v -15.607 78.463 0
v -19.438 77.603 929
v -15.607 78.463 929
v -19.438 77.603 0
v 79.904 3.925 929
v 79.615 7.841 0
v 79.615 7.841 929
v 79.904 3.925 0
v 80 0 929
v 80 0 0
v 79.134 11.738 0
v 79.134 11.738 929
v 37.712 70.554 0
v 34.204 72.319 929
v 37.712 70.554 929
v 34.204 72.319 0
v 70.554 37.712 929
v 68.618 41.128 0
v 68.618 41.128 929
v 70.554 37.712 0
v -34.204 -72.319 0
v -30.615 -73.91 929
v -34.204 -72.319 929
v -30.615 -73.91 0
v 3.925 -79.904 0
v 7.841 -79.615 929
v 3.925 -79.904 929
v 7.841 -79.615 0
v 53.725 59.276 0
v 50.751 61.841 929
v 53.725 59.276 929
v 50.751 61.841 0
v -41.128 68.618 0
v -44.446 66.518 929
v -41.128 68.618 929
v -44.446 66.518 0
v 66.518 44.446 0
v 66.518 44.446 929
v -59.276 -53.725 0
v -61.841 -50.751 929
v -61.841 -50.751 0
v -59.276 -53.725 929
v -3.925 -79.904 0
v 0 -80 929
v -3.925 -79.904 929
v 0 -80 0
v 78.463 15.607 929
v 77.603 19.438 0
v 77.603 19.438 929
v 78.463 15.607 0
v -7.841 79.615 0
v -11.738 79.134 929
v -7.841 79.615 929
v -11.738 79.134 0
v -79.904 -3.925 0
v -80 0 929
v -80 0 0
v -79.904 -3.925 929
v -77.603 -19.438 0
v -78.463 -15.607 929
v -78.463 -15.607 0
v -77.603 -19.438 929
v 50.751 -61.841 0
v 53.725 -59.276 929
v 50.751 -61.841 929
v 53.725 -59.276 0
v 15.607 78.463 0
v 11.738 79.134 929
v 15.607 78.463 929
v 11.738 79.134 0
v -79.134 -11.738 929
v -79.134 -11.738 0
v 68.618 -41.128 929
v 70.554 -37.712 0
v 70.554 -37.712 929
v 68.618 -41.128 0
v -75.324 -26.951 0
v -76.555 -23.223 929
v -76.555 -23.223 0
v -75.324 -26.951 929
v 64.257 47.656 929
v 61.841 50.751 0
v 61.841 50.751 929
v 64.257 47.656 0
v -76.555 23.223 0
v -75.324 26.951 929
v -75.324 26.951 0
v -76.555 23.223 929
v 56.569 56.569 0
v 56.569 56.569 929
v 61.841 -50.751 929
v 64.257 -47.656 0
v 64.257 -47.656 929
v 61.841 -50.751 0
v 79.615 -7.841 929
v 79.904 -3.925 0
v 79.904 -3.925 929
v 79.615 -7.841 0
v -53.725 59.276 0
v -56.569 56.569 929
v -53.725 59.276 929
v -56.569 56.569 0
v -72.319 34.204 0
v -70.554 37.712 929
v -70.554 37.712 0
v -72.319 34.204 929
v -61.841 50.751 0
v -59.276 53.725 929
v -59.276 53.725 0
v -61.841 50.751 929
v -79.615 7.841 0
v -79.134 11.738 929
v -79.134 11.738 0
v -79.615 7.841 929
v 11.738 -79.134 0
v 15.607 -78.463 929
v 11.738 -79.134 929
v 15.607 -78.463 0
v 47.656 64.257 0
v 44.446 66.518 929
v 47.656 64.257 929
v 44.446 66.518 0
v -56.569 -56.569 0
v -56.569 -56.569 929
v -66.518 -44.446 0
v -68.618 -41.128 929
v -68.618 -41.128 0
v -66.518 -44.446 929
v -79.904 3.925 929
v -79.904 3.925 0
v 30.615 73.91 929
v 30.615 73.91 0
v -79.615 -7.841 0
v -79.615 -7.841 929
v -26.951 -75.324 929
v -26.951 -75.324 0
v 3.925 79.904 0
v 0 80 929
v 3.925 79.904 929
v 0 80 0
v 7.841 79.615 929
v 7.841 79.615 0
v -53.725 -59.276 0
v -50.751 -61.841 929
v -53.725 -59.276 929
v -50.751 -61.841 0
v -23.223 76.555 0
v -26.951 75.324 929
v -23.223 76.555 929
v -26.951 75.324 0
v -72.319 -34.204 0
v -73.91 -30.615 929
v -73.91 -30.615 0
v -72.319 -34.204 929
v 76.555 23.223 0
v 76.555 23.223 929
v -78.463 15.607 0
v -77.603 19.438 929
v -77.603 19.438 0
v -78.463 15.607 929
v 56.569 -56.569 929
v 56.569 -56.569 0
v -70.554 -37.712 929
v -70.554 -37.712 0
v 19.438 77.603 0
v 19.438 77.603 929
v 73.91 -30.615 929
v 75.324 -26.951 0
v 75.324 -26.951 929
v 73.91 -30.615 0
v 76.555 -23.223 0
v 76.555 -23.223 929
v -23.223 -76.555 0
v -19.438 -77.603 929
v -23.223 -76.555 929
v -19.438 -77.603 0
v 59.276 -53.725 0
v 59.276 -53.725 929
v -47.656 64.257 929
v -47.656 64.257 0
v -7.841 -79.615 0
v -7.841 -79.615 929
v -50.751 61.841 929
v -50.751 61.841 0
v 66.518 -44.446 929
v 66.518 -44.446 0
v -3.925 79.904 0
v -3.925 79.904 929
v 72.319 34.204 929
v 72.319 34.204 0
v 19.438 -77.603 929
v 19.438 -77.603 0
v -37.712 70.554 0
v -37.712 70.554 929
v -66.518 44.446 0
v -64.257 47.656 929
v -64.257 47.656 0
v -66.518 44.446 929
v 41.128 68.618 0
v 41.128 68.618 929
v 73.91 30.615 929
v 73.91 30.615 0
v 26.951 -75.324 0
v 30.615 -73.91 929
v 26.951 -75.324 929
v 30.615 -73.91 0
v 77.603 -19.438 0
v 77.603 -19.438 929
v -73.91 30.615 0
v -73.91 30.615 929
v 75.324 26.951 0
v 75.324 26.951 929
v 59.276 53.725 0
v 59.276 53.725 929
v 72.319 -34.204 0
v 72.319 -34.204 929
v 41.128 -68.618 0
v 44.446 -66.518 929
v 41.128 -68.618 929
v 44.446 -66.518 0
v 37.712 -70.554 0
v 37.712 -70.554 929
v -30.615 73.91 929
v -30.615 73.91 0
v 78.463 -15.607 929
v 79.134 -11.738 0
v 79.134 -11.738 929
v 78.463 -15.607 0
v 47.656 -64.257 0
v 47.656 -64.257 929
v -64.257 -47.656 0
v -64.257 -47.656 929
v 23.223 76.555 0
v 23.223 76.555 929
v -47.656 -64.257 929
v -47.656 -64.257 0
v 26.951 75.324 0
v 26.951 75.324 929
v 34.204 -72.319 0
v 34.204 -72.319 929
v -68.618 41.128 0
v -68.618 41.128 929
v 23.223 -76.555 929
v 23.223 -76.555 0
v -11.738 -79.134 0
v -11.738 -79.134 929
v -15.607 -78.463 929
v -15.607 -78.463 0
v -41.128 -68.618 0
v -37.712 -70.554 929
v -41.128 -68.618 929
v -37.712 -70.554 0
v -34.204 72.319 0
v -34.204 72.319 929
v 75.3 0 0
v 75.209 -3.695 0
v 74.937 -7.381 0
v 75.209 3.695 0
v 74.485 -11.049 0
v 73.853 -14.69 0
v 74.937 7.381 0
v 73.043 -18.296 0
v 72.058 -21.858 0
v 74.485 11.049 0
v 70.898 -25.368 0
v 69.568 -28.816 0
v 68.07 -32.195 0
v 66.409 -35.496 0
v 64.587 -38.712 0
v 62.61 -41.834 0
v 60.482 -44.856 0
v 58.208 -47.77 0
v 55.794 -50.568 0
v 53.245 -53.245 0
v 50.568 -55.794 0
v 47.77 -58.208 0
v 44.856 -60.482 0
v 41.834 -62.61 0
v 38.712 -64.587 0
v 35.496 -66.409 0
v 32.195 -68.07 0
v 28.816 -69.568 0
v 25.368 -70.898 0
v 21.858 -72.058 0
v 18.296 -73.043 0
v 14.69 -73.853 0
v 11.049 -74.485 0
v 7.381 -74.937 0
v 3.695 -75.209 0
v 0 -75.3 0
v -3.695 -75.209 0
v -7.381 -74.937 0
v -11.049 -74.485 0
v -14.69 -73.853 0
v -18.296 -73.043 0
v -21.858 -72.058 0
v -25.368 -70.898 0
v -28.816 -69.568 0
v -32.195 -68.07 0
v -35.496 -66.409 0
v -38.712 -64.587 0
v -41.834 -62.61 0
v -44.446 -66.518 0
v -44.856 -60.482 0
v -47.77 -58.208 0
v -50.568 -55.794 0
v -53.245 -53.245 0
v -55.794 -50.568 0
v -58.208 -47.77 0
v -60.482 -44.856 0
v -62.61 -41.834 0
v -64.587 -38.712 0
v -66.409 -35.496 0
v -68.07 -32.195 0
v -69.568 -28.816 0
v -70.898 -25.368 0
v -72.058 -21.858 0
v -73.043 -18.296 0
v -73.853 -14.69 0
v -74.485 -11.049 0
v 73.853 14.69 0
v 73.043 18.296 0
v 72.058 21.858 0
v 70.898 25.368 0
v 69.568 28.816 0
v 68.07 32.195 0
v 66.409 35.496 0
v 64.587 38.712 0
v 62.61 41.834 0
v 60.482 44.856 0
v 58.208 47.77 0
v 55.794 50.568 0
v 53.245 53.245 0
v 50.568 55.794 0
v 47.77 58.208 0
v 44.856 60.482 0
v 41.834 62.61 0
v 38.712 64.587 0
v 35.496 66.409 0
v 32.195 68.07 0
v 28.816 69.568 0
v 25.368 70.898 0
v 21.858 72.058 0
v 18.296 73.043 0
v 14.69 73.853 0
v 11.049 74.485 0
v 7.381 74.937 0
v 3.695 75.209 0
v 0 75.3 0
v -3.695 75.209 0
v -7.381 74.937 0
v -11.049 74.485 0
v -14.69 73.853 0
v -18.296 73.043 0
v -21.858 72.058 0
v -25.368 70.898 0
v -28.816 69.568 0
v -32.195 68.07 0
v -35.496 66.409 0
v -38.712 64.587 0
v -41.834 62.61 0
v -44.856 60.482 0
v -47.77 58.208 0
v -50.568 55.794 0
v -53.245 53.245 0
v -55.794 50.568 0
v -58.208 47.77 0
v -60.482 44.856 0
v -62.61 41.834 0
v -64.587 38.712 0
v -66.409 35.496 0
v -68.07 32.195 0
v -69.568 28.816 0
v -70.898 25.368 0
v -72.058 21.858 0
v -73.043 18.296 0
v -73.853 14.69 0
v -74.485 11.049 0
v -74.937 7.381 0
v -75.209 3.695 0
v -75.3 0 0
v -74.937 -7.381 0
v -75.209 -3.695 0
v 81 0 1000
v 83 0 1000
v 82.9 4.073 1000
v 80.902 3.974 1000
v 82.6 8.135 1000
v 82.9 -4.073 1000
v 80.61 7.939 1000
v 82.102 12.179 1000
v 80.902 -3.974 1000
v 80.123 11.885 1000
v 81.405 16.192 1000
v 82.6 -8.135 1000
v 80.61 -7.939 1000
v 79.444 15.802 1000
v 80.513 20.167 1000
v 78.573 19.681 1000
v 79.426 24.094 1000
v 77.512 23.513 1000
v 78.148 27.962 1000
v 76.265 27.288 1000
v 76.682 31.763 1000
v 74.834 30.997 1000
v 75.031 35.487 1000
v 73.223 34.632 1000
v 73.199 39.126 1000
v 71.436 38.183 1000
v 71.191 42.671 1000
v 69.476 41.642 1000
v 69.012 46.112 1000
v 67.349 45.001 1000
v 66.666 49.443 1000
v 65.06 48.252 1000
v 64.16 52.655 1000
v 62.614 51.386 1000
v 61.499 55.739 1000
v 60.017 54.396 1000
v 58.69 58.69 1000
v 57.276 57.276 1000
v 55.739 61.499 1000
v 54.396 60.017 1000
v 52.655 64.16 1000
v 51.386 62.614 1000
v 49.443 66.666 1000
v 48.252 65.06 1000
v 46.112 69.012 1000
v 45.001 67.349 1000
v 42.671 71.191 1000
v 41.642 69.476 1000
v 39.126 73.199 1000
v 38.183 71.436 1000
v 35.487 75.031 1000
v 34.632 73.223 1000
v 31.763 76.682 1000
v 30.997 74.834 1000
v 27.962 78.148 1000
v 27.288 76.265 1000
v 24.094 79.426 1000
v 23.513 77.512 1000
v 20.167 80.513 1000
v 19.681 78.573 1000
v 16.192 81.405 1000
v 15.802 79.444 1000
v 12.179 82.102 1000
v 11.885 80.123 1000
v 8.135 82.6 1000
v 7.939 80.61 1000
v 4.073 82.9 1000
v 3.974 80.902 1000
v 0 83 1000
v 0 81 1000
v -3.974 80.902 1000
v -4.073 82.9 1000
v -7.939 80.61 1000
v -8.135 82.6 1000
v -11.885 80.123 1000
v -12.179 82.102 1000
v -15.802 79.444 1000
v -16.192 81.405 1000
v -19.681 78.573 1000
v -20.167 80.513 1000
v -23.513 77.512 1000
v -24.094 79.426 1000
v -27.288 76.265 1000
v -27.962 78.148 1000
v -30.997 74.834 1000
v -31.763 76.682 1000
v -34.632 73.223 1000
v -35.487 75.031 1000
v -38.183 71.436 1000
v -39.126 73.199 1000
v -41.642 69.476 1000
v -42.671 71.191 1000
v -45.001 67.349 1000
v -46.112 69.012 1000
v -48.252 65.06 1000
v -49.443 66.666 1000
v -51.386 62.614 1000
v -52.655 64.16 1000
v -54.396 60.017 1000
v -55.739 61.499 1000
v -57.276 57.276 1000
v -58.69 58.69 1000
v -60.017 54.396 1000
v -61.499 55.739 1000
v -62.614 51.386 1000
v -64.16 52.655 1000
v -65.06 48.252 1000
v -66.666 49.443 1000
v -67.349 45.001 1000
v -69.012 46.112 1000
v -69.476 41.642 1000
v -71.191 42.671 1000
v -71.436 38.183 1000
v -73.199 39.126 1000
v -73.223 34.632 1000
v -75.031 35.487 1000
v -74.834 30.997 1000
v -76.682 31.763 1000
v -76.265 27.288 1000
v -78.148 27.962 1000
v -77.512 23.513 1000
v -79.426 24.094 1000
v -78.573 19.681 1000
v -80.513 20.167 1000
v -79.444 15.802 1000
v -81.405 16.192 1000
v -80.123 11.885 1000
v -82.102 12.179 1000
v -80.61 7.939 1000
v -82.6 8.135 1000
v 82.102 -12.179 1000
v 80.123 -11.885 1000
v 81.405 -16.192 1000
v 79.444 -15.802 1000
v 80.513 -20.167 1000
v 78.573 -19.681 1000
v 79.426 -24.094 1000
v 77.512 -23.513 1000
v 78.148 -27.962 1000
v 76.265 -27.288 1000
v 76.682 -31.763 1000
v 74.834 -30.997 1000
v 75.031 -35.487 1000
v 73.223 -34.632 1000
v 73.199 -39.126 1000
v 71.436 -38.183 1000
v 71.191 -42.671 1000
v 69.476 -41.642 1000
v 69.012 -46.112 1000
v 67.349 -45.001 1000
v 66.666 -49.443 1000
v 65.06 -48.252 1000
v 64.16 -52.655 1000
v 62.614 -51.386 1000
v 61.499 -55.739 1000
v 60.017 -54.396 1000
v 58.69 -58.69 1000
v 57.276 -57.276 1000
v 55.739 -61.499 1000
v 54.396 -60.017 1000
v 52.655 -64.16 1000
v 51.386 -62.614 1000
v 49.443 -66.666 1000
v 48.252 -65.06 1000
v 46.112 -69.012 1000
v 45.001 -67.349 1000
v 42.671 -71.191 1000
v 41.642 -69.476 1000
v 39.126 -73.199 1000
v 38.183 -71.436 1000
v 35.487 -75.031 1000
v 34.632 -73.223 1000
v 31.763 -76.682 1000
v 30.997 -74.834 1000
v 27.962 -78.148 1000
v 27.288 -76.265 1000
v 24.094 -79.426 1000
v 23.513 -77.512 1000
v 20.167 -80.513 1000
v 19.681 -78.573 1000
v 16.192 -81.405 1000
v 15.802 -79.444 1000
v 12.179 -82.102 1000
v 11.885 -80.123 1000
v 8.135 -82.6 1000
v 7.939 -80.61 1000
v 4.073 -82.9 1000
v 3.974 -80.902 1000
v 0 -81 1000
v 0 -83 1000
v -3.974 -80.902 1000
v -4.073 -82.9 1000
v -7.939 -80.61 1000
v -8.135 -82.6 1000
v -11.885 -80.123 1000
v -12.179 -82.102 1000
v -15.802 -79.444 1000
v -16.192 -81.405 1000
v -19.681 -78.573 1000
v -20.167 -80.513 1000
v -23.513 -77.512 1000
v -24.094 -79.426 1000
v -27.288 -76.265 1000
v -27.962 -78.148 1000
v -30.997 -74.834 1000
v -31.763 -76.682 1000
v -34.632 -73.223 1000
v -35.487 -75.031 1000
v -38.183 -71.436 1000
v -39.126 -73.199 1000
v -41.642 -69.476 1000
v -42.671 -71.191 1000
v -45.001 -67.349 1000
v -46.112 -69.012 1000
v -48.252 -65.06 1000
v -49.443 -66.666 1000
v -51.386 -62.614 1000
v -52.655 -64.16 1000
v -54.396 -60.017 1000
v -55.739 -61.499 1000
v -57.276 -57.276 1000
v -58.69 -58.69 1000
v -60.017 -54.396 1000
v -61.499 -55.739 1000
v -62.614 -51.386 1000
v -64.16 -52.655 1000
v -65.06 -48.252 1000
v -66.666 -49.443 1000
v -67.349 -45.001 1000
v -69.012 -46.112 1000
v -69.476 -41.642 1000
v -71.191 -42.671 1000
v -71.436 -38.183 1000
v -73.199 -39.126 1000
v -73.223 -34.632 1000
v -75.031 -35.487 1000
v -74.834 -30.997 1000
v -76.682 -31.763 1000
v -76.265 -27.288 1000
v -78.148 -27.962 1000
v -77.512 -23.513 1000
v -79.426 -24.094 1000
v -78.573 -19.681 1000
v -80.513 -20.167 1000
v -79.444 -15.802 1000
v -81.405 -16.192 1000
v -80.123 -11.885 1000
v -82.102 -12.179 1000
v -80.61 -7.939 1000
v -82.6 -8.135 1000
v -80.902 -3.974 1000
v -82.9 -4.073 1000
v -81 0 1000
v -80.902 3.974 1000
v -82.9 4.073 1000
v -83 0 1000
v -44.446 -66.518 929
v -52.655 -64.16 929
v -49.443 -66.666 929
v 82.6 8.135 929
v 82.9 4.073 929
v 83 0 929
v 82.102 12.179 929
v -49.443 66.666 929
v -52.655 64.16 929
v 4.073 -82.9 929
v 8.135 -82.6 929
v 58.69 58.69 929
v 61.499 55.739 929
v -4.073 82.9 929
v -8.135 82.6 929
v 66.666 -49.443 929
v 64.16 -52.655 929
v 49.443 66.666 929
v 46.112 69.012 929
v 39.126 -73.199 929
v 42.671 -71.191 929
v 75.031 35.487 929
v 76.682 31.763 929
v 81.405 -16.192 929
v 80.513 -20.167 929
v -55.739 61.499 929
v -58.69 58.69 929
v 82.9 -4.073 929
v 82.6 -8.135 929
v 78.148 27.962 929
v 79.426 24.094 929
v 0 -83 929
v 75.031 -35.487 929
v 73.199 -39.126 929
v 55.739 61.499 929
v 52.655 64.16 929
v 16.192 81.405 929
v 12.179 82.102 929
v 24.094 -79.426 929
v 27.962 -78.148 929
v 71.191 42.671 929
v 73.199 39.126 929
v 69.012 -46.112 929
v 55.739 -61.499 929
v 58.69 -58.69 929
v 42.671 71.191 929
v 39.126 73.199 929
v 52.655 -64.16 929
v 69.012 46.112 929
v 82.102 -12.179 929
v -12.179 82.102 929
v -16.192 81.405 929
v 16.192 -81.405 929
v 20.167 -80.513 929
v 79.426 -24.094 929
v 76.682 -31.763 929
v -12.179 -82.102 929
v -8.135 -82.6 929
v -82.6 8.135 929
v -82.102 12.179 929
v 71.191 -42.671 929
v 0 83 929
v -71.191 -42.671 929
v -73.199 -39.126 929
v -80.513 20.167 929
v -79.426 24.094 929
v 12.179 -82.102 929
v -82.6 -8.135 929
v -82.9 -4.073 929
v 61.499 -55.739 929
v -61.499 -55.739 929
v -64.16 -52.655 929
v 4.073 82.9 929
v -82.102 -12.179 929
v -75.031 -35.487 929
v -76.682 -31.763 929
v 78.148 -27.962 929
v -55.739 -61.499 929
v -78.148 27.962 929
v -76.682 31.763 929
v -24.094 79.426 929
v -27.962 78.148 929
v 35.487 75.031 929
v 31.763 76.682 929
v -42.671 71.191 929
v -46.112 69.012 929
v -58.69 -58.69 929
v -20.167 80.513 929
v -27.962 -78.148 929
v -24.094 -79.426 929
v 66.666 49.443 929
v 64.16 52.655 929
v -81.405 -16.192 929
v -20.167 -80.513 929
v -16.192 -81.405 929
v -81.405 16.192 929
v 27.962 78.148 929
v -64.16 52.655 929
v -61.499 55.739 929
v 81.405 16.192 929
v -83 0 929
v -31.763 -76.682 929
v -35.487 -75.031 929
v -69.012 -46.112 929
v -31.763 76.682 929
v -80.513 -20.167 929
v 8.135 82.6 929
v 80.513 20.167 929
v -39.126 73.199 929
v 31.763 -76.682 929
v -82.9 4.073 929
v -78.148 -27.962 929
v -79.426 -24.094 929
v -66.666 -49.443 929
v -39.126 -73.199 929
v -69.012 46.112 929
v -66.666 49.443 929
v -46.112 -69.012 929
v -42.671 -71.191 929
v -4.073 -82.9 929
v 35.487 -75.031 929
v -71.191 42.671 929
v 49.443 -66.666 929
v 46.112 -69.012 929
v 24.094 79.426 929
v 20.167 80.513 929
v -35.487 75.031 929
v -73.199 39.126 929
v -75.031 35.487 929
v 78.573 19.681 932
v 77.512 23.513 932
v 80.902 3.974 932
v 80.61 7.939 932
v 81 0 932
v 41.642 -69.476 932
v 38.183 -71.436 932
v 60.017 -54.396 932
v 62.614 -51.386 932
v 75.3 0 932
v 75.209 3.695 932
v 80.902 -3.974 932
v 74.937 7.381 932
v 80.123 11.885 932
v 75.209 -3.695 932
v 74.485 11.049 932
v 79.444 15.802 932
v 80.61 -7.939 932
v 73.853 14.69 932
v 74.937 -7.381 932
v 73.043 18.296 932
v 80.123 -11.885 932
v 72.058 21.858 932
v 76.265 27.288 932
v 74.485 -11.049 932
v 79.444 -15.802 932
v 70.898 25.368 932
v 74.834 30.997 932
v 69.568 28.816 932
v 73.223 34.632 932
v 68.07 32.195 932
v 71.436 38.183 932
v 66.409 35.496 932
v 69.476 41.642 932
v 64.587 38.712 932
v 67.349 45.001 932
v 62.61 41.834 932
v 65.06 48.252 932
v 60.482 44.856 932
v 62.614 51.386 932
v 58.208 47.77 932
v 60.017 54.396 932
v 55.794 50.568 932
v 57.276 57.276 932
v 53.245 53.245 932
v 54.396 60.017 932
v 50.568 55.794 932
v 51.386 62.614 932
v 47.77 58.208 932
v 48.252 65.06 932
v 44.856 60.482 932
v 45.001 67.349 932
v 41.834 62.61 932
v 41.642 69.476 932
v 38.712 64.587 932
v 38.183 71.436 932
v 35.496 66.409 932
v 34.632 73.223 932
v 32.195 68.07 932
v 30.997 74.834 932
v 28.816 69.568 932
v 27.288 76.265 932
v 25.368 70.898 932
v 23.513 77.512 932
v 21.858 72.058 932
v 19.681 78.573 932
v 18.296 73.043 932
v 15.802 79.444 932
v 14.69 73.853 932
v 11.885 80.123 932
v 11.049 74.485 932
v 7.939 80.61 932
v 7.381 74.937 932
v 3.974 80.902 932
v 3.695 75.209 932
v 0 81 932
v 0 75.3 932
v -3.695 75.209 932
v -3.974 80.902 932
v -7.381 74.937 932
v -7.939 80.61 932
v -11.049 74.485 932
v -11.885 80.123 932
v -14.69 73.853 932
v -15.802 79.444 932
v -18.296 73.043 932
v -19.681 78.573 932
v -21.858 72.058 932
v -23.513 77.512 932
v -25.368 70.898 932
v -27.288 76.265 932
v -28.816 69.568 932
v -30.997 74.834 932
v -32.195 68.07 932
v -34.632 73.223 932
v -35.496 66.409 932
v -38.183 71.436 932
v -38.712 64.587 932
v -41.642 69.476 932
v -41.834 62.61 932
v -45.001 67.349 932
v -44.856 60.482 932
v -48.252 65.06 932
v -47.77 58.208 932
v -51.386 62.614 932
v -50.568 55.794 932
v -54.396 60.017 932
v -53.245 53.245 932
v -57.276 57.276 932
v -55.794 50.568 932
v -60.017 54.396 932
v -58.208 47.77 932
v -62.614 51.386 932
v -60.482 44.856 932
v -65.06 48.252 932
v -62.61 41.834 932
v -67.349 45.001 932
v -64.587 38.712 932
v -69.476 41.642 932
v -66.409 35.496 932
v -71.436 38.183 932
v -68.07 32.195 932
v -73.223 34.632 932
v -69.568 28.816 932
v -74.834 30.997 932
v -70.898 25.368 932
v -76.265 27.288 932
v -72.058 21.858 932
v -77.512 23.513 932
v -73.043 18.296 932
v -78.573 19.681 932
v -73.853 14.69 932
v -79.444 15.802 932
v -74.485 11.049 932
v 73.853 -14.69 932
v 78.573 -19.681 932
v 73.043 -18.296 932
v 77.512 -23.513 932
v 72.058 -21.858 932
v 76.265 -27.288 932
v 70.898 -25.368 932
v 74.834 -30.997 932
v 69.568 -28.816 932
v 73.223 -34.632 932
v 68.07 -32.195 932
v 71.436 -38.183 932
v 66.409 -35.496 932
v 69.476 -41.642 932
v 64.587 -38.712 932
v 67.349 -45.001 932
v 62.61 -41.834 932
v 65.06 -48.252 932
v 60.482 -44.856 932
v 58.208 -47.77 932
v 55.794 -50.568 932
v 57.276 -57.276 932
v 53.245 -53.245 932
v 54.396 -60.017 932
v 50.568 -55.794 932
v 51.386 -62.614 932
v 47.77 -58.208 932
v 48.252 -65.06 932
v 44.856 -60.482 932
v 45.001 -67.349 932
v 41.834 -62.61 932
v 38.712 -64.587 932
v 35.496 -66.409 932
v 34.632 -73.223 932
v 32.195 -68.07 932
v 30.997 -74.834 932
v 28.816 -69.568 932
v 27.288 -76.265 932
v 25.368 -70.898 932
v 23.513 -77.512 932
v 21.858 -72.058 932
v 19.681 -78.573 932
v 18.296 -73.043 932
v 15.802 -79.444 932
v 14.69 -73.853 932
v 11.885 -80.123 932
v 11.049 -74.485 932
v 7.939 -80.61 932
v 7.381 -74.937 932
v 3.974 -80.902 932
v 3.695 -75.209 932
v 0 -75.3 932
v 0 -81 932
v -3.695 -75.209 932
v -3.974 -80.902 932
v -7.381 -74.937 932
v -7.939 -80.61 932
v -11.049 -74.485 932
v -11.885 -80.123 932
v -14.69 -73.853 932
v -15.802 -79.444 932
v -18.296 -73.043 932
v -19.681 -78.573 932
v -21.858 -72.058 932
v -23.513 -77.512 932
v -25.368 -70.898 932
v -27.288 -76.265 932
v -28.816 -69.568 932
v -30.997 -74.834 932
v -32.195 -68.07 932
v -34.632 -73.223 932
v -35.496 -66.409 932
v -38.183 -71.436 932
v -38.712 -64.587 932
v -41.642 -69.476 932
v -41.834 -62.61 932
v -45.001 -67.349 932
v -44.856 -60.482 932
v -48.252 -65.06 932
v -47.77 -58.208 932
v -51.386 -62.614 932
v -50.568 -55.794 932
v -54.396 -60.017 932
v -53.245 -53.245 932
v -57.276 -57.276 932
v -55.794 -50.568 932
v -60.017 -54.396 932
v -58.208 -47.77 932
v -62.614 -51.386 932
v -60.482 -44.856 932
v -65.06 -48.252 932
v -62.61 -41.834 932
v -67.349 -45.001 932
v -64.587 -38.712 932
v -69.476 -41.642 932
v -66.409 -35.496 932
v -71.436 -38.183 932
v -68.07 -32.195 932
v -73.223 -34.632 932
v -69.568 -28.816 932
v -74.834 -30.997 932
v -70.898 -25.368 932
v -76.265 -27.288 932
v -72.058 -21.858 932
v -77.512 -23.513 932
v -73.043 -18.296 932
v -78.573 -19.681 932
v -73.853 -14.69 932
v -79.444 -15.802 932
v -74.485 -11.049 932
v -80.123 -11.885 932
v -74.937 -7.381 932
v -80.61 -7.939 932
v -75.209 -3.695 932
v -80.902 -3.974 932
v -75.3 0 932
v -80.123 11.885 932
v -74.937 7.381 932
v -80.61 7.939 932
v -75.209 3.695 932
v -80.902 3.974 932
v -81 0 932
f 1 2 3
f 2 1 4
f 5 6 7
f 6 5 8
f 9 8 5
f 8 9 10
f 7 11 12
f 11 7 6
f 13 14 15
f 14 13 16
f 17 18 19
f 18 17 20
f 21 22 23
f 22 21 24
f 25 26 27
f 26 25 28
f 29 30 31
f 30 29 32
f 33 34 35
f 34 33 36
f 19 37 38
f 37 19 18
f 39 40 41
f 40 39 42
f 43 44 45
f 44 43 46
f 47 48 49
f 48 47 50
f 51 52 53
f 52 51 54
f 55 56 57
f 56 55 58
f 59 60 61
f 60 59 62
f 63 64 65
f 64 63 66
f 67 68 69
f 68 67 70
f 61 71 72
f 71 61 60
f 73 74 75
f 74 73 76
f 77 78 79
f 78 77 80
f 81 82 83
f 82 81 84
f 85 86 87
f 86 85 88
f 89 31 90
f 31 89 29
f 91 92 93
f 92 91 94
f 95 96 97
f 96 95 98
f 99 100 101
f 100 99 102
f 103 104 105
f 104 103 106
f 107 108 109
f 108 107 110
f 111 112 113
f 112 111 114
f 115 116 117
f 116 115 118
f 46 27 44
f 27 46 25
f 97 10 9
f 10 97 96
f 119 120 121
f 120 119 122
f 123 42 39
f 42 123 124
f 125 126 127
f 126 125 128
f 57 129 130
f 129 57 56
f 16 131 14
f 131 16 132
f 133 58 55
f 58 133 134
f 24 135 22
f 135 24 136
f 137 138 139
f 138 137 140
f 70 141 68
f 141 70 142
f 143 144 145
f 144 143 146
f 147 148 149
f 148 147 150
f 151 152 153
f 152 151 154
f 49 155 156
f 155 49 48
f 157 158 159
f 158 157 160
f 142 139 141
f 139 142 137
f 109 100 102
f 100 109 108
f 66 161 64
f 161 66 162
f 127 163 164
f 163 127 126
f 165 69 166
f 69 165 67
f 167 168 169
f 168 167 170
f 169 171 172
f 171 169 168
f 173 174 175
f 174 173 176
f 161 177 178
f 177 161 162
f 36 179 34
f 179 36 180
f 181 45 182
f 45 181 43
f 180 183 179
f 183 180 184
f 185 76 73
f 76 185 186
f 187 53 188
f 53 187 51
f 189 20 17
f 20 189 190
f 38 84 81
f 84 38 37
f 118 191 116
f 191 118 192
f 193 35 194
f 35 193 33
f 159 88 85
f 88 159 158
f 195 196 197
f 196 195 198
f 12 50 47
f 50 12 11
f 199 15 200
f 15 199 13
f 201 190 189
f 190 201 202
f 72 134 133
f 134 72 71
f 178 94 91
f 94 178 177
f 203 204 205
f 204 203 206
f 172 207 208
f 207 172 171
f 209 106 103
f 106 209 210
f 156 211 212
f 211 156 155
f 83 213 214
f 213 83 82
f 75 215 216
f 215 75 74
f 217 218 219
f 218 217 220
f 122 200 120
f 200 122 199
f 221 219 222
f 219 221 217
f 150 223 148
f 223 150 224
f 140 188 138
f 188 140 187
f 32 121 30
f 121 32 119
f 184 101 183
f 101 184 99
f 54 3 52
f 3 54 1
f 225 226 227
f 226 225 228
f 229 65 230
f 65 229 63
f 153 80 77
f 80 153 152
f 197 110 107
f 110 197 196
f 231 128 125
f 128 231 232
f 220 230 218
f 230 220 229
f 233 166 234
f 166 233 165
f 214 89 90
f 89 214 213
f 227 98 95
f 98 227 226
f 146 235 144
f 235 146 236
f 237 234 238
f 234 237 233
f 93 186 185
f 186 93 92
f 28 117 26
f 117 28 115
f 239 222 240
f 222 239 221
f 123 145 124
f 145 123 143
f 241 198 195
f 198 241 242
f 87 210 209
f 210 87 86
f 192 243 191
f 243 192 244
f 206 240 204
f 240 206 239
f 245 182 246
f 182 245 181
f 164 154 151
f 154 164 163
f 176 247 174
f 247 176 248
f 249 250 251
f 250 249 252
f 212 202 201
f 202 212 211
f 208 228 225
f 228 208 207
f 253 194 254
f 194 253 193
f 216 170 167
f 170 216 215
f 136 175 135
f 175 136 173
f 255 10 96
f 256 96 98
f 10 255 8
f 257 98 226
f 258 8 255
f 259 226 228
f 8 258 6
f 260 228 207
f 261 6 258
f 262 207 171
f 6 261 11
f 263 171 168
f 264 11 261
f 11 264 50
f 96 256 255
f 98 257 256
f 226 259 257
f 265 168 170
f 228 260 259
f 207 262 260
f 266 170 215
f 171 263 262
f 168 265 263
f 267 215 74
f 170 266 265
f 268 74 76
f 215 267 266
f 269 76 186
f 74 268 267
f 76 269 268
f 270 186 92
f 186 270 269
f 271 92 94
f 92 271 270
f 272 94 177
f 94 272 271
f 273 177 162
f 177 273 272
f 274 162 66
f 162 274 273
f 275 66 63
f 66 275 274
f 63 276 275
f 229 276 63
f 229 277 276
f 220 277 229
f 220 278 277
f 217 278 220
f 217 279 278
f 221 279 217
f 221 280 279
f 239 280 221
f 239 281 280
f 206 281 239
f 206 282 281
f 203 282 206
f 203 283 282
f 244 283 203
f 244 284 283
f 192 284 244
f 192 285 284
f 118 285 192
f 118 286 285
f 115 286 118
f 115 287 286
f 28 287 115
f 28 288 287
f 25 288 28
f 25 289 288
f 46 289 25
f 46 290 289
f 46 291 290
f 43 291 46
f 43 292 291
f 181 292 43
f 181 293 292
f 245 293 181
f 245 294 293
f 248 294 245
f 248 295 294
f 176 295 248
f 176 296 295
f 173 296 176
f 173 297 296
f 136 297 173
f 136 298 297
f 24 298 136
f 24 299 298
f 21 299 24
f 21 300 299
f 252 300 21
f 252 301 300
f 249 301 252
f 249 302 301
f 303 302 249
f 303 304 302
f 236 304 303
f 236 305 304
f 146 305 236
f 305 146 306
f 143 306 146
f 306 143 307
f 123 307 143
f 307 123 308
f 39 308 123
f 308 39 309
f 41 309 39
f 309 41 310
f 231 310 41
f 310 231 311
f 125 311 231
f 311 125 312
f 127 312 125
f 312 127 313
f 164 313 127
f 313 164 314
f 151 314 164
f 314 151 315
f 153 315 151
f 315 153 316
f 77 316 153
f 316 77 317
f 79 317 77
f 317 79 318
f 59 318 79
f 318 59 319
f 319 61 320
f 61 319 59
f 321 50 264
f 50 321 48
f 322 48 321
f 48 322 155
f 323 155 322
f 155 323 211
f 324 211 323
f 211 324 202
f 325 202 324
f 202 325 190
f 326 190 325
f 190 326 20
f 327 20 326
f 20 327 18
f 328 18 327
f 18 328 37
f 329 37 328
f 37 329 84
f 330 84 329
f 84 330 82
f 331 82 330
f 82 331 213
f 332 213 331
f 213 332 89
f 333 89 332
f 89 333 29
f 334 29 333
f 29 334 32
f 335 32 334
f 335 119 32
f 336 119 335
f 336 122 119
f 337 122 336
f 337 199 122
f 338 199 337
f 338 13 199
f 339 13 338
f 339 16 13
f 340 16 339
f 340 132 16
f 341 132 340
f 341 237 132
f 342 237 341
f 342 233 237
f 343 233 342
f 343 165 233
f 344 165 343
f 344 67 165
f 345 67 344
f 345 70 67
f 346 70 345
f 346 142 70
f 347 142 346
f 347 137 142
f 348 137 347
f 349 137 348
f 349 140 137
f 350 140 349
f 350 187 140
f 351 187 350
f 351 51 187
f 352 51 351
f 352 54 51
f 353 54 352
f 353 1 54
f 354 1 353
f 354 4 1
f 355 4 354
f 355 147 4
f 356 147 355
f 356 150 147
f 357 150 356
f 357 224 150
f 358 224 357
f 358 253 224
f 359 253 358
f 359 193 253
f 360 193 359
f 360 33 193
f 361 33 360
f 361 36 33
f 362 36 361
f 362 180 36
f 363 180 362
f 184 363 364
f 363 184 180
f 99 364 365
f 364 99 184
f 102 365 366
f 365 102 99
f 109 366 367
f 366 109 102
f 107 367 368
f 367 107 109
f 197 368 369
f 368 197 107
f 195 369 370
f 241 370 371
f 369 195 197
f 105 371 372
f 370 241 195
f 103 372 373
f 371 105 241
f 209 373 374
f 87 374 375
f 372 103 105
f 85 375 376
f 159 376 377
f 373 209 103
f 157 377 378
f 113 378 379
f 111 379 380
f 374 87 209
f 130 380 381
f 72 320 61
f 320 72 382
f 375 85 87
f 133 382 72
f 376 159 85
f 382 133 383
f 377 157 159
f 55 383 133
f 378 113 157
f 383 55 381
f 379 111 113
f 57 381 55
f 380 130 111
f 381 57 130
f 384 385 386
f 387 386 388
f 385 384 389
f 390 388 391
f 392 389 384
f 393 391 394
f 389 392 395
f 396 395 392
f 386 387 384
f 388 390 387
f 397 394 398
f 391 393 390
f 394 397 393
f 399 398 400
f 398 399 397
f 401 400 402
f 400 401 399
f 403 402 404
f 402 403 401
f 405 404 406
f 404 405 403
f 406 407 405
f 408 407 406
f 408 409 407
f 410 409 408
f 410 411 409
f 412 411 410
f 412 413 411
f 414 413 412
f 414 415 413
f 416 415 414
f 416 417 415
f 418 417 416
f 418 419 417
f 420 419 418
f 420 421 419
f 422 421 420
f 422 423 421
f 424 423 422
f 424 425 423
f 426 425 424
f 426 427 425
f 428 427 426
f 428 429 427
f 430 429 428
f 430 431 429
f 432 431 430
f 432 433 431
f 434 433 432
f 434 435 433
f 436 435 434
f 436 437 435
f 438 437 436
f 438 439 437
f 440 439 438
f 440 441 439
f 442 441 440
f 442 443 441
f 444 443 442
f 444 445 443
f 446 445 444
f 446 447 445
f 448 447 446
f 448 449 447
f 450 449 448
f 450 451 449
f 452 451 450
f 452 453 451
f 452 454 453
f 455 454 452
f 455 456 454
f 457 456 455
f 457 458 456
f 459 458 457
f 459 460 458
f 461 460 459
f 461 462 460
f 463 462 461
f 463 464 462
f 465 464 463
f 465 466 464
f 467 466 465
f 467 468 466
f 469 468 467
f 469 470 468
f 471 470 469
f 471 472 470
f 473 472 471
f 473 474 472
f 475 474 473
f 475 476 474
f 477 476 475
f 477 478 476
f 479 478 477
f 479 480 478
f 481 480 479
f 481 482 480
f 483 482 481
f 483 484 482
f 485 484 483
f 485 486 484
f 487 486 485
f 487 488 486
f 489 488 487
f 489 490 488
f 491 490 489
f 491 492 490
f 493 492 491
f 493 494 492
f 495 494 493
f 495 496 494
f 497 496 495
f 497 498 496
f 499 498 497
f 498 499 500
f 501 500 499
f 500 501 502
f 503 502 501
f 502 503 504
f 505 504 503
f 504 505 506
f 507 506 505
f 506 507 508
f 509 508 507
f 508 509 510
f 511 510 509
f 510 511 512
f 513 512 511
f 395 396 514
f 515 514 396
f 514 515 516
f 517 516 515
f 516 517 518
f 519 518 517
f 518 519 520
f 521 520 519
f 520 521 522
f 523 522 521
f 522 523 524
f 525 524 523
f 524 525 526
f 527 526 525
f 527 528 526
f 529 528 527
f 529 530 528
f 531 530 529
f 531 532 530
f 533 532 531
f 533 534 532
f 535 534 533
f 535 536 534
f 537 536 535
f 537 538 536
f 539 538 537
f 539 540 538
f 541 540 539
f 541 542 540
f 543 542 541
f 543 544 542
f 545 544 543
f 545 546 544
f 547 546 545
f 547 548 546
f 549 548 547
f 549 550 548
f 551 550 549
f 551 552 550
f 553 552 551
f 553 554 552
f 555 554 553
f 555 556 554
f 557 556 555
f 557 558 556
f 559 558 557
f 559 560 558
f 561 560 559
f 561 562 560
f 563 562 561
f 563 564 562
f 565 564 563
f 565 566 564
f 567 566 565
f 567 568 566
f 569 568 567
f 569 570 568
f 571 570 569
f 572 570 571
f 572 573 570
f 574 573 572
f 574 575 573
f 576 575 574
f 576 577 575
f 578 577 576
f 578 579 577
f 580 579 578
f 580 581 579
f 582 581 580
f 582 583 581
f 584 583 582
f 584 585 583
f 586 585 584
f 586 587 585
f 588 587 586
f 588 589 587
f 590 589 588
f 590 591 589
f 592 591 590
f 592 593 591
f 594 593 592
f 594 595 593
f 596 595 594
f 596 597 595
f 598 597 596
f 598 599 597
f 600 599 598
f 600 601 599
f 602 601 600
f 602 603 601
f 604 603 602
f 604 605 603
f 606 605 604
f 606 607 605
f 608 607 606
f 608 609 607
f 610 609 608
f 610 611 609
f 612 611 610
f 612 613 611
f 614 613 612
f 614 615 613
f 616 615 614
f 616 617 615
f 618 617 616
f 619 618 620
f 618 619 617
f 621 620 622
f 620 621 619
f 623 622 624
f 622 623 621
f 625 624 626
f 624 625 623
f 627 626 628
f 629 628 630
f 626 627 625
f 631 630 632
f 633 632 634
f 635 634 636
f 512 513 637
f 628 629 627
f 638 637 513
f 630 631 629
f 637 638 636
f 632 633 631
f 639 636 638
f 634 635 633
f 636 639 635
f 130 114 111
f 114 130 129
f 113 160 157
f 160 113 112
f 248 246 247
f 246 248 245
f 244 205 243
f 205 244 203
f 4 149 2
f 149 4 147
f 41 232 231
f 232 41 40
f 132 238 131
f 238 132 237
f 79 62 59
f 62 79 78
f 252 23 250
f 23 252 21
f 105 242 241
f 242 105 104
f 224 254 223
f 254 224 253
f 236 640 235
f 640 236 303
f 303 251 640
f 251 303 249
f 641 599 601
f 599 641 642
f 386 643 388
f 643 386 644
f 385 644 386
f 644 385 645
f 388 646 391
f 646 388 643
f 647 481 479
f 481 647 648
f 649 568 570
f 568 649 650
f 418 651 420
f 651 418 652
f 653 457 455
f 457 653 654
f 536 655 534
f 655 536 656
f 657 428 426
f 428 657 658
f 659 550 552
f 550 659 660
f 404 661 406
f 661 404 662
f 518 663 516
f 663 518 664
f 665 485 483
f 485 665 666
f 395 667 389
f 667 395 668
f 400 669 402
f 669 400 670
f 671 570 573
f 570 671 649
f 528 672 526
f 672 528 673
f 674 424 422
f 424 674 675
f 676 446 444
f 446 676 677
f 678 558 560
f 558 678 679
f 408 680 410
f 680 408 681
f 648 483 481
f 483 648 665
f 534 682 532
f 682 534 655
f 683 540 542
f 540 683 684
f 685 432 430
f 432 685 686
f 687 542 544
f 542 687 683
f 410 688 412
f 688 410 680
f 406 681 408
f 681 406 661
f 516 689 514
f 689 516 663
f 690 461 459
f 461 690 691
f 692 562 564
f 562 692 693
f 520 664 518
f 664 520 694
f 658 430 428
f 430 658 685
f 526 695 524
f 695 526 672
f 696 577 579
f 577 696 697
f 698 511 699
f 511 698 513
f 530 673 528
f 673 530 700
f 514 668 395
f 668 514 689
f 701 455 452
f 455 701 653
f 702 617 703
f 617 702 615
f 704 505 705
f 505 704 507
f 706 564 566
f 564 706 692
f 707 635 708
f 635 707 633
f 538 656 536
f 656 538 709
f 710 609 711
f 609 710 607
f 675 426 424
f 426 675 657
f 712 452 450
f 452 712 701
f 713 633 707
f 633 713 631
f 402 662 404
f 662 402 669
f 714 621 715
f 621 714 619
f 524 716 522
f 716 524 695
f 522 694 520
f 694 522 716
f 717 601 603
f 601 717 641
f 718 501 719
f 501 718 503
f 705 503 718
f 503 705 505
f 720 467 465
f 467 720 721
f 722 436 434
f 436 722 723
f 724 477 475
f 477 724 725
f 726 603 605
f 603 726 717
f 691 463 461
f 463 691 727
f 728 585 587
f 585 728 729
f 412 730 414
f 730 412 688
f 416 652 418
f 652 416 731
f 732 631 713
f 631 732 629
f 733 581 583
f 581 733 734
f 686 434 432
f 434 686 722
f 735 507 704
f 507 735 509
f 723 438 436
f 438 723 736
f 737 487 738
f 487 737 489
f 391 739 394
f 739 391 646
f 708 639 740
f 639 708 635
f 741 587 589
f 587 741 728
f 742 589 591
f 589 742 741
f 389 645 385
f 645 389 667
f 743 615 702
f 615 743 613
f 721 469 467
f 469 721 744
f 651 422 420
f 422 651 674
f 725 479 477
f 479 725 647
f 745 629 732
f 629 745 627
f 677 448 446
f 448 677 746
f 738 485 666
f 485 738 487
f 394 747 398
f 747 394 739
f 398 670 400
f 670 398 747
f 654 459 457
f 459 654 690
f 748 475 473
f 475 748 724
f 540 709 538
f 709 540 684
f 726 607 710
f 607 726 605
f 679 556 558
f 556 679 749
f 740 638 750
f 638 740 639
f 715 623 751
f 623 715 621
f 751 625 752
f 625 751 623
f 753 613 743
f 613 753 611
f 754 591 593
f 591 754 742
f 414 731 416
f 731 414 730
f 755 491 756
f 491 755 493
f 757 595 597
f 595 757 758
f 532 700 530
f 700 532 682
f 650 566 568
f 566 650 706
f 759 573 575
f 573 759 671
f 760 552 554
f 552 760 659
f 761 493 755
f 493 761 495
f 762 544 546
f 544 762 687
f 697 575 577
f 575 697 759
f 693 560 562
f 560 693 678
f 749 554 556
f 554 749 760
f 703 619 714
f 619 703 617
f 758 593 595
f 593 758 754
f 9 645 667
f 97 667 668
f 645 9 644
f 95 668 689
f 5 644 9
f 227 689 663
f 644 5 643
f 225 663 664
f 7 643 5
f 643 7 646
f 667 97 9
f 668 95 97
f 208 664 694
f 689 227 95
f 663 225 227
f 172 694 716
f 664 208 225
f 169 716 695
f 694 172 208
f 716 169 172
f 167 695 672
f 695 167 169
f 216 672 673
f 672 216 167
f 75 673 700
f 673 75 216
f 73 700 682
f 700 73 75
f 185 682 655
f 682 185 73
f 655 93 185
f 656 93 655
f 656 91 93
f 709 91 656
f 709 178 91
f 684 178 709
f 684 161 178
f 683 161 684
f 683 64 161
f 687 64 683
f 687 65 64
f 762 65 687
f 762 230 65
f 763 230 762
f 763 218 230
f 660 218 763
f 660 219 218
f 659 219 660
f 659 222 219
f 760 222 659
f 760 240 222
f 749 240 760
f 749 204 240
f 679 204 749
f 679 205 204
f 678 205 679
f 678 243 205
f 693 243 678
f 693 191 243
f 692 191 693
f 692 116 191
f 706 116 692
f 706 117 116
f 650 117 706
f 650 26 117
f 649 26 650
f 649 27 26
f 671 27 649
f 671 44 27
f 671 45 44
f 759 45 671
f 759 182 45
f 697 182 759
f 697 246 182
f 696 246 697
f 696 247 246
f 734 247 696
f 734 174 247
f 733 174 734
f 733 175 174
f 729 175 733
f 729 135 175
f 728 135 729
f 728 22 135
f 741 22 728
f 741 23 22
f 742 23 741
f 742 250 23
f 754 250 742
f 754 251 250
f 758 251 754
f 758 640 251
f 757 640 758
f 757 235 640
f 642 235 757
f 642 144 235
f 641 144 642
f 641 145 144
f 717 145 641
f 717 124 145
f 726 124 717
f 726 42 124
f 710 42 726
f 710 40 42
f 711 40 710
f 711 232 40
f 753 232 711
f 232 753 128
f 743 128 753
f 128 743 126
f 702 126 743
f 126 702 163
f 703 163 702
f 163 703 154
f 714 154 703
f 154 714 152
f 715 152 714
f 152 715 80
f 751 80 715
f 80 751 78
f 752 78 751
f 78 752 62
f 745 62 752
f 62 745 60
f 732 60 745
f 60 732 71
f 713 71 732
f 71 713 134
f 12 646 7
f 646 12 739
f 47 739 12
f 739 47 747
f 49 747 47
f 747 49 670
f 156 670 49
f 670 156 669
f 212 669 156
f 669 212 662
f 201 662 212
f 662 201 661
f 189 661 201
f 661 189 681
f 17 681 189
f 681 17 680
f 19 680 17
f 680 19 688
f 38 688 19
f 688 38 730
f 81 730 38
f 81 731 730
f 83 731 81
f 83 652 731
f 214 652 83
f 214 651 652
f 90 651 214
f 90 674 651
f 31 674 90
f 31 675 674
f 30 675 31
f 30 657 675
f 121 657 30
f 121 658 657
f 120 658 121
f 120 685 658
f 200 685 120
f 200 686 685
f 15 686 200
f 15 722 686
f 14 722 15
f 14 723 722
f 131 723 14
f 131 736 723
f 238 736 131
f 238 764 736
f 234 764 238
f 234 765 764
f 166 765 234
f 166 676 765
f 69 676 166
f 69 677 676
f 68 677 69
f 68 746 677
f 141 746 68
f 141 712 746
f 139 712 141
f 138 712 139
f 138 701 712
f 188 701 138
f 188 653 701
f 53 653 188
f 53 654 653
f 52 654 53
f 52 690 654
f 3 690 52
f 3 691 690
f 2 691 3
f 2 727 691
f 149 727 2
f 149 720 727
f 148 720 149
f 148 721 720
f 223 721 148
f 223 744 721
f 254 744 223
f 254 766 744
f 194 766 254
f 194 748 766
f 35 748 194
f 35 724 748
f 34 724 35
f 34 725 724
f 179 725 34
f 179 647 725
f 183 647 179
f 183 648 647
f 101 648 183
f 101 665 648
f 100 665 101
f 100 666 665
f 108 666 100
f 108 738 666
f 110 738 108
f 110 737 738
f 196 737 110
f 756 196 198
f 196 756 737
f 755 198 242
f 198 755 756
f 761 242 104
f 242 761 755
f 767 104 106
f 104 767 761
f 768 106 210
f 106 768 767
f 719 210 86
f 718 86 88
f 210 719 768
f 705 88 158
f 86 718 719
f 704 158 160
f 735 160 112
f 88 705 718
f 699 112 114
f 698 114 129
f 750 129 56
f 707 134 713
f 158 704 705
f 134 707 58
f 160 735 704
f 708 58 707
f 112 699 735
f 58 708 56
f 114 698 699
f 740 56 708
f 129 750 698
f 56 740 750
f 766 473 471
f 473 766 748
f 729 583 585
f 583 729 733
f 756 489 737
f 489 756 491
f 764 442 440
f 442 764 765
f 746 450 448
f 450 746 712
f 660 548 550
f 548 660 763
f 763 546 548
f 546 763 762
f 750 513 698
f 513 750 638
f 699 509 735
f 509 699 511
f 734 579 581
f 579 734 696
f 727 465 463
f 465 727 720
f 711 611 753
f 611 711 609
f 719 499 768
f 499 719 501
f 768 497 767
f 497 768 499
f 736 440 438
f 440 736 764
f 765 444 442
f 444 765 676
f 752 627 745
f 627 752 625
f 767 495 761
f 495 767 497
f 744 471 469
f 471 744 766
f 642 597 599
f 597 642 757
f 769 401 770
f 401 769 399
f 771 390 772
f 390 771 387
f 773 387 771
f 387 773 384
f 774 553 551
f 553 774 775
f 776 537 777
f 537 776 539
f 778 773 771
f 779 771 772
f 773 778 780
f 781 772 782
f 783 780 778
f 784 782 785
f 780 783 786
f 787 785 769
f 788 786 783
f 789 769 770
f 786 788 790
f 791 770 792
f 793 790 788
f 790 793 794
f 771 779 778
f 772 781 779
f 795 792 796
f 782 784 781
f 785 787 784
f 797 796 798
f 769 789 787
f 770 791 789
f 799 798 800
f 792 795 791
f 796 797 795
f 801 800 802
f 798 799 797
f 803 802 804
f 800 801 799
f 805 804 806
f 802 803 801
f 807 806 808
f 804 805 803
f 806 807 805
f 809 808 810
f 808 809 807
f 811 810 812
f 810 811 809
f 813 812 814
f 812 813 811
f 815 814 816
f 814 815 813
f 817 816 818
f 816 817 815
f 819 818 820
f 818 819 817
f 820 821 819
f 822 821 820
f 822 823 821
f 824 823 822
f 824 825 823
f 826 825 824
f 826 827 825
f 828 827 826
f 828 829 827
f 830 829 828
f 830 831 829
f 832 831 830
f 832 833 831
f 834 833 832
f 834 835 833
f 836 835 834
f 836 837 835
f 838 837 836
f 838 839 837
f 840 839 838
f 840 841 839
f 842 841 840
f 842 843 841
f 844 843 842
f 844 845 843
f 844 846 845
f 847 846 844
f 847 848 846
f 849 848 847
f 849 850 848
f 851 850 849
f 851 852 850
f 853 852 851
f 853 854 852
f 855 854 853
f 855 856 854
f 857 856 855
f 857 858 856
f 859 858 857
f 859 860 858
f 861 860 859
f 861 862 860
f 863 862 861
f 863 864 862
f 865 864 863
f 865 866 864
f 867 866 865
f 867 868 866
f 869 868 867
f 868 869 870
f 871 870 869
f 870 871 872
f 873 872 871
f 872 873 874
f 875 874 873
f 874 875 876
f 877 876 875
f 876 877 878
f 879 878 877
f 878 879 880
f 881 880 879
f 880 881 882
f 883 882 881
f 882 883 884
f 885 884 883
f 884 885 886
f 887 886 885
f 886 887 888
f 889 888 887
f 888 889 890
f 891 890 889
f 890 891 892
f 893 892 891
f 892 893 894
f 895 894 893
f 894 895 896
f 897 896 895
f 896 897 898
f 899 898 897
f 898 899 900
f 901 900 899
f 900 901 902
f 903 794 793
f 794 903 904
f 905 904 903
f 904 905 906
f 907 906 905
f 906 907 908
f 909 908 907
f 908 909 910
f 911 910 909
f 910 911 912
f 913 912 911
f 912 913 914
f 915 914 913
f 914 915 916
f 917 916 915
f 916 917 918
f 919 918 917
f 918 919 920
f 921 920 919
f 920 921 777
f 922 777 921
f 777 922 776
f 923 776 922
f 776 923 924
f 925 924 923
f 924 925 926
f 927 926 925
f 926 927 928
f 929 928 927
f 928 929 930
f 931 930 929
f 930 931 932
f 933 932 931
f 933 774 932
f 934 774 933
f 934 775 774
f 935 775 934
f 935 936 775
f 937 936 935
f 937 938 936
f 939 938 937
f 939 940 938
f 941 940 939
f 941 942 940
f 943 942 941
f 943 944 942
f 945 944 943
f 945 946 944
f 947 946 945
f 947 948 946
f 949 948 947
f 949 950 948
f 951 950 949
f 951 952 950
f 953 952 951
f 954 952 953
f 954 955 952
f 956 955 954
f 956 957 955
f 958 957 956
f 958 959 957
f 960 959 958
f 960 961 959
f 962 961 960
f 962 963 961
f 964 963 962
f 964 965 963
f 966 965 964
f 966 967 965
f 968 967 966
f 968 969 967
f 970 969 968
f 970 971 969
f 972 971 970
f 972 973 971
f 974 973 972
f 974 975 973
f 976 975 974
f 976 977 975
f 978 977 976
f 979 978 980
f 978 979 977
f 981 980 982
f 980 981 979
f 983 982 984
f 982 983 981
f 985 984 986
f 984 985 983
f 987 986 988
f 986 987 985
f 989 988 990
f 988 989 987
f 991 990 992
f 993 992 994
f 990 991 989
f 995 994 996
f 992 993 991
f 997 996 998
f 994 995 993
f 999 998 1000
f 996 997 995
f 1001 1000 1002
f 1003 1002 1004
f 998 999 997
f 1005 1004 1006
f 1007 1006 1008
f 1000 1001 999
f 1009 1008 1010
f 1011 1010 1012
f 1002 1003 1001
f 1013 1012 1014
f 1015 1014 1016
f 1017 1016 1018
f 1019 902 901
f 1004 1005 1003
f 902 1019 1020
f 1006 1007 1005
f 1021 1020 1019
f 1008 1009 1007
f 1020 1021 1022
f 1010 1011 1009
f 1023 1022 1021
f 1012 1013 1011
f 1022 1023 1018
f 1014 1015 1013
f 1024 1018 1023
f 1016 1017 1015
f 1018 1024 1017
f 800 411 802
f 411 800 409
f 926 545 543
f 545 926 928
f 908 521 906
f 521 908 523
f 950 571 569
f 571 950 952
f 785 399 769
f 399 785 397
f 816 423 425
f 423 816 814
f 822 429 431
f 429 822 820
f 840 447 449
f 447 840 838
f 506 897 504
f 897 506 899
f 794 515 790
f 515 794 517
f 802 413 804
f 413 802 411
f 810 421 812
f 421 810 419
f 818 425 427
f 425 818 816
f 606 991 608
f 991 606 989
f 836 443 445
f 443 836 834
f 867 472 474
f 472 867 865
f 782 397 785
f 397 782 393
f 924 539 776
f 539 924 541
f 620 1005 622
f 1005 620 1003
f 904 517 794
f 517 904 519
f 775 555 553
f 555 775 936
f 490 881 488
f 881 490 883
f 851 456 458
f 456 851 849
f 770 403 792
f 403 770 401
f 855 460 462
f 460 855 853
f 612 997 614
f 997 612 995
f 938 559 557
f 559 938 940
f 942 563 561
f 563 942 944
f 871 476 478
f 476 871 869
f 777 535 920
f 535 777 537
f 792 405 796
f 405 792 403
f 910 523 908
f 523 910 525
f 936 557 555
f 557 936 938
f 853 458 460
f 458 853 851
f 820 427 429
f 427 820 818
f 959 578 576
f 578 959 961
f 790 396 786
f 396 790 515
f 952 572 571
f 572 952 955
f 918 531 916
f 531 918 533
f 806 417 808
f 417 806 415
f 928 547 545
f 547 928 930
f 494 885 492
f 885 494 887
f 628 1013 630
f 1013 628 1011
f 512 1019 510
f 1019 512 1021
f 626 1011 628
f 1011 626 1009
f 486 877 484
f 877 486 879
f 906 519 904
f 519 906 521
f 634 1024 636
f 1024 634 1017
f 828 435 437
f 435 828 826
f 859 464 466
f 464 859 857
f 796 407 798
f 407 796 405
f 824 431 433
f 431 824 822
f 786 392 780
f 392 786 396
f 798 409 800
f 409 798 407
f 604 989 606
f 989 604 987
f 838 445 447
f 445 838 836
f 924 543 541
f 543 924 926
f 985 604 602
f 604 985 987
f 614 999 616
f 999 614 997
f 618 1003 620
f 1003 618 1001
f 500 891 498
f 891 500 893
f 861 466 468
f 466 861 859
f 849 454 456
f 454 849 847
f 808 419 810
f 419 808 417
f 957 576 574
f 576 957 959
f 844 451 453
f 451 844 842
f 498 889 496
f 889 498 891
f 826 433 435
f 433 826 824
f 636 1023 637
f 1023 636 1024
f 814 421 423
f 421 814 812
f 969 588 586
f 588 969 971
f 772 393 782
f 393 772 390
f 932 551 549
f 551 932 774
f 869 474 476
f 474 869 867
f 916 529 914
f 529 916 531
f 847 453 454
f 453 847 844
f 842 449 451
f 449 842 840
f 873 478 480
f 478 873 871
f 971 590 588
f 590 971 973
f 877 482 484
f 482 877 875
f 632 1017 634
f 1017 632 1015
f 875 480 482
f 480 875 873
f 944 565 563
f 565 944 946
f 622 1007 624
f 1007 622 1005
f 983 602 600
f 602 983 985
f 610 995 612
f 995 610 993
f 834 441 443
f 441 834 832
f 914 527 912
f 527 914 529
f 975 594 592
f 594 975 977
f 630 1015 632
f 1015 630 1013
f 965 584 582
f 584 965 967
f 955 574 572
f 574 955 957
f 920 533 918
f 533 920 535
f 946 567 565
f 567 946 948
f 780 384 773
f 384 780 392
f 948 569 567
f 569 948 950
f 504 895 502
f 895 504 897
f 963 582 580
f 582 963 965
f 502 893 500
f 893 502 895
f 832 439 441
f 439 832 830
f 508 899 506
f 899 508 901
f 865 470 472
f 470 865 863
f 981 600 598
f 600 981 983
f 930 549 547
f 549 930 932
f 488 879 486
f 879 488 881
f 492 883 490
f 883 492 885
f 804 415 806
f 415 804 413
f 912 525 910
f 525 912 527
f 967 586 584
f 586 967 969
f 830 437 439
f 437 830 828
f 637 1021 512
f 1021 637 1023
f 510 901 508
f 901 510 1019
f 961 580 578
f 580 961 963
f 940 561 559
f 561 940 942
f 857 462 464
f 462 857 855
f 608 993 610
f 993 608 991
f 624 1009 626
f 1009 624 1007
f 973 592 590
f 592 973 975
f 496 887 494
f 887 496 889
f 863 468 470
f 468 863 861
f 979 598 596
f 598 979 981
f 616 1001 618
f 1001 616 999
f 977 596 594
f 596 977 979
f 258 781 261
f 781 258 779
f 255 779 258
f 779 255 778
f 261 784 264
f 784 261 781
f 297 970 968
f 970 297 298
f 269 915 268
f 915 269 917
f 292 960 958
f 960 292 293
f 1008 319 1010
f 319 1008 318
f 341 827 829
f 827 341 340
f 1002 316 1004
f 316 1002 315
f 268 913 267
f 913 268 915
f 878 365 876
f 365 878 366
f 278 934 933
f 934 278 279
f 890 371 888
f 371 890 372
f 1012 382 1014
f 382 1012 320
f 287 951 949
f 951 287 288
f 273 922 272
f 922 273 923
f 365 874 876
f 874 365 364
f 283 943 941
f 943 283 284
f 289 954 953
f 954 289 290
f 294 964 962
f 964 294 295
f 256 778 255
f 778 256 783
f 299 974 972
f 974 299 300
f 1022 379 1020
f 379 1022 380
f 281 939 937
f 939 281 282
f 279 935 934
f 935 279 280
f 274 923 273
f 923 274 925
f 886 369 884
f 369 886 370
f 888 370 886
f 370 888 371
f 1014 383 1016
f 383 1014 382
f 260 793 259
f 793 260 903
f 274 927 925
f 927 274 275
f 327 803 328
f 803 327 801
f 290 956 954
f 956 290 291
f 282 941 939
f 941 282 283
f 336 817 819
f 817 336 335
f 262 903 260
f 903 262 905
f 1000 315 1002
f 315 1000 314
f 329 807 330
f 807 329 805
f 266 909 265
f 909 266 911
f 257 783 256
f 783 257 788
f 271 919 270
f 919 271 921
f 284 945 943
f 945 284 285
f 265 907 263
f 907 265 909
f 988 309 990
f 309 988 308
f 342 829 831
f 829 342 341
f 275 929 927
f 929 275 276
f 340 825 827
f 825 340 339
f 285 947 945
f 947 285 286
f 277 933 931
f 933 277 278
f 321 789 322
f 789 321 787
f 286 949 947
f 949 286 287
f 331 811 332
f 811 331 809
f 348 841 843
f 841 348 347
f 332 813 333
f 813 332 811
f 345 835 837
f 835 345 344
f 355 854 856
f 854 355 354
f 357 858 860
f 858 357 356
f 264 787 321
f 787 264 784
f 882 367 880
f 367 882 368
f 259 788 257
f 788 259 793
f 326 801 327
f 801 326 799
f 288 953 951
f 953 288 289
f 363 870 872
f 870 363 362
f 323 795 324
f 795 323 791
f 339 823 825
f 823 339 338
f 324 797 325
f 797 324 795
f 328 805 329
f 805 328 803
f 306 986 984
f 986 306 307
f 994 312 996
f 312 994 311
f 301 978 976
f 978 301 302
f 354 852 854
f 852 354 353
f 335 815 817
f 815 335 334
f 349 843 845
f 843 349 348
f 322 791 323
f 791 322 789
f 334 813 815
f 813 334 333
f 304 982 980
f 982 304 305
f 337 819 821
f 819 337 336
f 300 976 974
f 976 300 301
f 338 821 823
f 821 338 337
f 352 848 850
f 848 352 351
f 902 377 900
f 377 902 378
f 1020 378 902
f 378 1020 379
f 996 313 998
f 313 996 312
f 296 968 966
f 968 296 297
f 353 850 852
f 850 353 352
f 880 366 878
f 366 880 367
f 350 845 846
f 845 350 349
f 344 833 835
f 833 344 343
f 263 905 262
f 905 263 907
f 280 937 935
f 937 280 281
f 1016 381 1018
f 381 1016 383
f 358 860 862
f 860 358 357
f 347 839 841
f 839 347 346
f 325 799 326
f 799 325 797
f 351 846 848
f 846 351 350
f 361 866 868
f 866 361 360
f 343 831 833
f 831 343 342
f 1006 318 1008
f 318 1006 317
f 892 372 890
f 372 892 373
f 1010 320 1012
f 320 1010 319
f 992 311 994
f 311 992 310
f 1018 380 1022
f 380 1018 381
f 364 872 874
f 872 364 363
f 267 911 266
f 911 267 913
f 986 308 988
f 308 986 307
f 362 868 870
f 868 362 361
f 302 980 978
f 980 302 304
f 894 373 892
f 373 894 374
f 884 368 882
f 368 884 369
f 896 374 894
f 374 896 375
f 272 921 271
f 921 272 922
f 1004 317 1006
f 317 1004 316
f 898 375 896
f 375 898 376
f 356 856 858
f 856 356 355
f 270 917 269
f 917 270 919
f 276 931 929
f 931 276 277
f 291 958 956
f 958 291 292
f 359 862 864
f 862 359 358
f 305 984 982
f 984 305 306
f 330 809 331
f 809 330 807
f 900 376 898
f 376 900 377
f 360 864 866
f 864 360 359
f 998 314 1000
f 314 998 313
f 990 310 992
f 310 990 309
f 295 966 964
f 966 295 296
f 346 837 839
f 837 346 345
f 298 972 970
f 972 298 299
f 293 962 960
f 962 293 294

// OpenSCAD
// HT 160 pipe 1000 mm (single connected solid) - FIXED

// Parameters
pipe_standard = 1; //[1:1:1]
nominal_diameter = 160; //[80:320:1]
length_mm = 1000; //[500:2000:10]
include_end_fitting = 1; //[0:1:1]

od_mm = 160; //[80:320:1]
wall_thickness_mm = 4.7; //[2.35:9.4:0.1]

socket_length_mm = 70; //[35:140:1]
socket_wall_extra_mm = 3.0; //[1.5:6.0:0.1]
socket_clearance_mm = 1.0; //[0.5:2.0:0.1]

stop_ring_thickness_mm = 3.0; //[1.5:6.0:0.1]
stop_ring_depth_mm = 6.0; //[3.0:12.0:0.1]

overlap_mm = 1.0; //[0.5:2.0:0.1]

$fn = 128;

module ht_pipe() {
  od_r = od_mm/2;
  id_r = od_r - wall_thickness_mm;

  // Guards to prevent invalid/empty geometry
  eps = 0.01;
  ov  = max(overlap_mm, eps);

  id_r_safe = max(eps, id_r);

  socket_id_r = max(id_r_safe + eps, od_r + socket_clearance_mm);
  socket_od_r = max(od_r + eps, od_r + socket_wall_extra_mm);

  // Ensure socket fits within length
  sock_len = min(socket_length_mm, length_mm);
  socket_z0 = length_mm - sock_len;

  // Stop ring: keep a short section at socket start with smaller ID (id_r_safe)
  ring_t = min(stop_ring_thickness_mm, sock_len);
  ring_cut_r = max(id_r_safe, socket_id_r - stop_ring_depth_mm);

  color([0.85, 0.85, 0.8])
  difference() {
    // Outer solid (ONE connected union)
    union() {
      cylinder(h=length_mm, r=od_r, center=false);

      if (include_end_fitting && sock_len > 0) {
        // Overlap into main pipe by ov to guarantee connectivity
        translate([0, 0, socket_z0 - ov])
          cylinder(h=sock_len + ov, r=socket_od_r, center=false);
      }
    }

    // Inner void through entire pipe (extend slightly for clean subtraction)
    translate([0, 0, -ov])
      cylinder(h=length_mm + 2*ov, r=id_r_safe, center=false);

    if (include_end_fitting && sock_len > 0) {
      // Enlarge inner diameter inside socket region (clearance)
      // Start slightly AFTER socket start so the stop-ring section remains at id_r_safe
      translate([0, 0, socket_z0 + ring_t - ov])
        cylinder(h=(sock_len - ring_t) + 2*ov, r=socket_id_r, center=false);

      // Create the internal shoulder by cutting a smaller radius only in the ring zone
      // This removes material between ring_cut_r and socket_id_r in the first ring_t mm.
      translate([0, 0, socket_z0 - ov])
        cylinder(h=ring_t + 2*ov, r=ring_cut_r, center=false);
    }
  }
}

ht_pipe();
